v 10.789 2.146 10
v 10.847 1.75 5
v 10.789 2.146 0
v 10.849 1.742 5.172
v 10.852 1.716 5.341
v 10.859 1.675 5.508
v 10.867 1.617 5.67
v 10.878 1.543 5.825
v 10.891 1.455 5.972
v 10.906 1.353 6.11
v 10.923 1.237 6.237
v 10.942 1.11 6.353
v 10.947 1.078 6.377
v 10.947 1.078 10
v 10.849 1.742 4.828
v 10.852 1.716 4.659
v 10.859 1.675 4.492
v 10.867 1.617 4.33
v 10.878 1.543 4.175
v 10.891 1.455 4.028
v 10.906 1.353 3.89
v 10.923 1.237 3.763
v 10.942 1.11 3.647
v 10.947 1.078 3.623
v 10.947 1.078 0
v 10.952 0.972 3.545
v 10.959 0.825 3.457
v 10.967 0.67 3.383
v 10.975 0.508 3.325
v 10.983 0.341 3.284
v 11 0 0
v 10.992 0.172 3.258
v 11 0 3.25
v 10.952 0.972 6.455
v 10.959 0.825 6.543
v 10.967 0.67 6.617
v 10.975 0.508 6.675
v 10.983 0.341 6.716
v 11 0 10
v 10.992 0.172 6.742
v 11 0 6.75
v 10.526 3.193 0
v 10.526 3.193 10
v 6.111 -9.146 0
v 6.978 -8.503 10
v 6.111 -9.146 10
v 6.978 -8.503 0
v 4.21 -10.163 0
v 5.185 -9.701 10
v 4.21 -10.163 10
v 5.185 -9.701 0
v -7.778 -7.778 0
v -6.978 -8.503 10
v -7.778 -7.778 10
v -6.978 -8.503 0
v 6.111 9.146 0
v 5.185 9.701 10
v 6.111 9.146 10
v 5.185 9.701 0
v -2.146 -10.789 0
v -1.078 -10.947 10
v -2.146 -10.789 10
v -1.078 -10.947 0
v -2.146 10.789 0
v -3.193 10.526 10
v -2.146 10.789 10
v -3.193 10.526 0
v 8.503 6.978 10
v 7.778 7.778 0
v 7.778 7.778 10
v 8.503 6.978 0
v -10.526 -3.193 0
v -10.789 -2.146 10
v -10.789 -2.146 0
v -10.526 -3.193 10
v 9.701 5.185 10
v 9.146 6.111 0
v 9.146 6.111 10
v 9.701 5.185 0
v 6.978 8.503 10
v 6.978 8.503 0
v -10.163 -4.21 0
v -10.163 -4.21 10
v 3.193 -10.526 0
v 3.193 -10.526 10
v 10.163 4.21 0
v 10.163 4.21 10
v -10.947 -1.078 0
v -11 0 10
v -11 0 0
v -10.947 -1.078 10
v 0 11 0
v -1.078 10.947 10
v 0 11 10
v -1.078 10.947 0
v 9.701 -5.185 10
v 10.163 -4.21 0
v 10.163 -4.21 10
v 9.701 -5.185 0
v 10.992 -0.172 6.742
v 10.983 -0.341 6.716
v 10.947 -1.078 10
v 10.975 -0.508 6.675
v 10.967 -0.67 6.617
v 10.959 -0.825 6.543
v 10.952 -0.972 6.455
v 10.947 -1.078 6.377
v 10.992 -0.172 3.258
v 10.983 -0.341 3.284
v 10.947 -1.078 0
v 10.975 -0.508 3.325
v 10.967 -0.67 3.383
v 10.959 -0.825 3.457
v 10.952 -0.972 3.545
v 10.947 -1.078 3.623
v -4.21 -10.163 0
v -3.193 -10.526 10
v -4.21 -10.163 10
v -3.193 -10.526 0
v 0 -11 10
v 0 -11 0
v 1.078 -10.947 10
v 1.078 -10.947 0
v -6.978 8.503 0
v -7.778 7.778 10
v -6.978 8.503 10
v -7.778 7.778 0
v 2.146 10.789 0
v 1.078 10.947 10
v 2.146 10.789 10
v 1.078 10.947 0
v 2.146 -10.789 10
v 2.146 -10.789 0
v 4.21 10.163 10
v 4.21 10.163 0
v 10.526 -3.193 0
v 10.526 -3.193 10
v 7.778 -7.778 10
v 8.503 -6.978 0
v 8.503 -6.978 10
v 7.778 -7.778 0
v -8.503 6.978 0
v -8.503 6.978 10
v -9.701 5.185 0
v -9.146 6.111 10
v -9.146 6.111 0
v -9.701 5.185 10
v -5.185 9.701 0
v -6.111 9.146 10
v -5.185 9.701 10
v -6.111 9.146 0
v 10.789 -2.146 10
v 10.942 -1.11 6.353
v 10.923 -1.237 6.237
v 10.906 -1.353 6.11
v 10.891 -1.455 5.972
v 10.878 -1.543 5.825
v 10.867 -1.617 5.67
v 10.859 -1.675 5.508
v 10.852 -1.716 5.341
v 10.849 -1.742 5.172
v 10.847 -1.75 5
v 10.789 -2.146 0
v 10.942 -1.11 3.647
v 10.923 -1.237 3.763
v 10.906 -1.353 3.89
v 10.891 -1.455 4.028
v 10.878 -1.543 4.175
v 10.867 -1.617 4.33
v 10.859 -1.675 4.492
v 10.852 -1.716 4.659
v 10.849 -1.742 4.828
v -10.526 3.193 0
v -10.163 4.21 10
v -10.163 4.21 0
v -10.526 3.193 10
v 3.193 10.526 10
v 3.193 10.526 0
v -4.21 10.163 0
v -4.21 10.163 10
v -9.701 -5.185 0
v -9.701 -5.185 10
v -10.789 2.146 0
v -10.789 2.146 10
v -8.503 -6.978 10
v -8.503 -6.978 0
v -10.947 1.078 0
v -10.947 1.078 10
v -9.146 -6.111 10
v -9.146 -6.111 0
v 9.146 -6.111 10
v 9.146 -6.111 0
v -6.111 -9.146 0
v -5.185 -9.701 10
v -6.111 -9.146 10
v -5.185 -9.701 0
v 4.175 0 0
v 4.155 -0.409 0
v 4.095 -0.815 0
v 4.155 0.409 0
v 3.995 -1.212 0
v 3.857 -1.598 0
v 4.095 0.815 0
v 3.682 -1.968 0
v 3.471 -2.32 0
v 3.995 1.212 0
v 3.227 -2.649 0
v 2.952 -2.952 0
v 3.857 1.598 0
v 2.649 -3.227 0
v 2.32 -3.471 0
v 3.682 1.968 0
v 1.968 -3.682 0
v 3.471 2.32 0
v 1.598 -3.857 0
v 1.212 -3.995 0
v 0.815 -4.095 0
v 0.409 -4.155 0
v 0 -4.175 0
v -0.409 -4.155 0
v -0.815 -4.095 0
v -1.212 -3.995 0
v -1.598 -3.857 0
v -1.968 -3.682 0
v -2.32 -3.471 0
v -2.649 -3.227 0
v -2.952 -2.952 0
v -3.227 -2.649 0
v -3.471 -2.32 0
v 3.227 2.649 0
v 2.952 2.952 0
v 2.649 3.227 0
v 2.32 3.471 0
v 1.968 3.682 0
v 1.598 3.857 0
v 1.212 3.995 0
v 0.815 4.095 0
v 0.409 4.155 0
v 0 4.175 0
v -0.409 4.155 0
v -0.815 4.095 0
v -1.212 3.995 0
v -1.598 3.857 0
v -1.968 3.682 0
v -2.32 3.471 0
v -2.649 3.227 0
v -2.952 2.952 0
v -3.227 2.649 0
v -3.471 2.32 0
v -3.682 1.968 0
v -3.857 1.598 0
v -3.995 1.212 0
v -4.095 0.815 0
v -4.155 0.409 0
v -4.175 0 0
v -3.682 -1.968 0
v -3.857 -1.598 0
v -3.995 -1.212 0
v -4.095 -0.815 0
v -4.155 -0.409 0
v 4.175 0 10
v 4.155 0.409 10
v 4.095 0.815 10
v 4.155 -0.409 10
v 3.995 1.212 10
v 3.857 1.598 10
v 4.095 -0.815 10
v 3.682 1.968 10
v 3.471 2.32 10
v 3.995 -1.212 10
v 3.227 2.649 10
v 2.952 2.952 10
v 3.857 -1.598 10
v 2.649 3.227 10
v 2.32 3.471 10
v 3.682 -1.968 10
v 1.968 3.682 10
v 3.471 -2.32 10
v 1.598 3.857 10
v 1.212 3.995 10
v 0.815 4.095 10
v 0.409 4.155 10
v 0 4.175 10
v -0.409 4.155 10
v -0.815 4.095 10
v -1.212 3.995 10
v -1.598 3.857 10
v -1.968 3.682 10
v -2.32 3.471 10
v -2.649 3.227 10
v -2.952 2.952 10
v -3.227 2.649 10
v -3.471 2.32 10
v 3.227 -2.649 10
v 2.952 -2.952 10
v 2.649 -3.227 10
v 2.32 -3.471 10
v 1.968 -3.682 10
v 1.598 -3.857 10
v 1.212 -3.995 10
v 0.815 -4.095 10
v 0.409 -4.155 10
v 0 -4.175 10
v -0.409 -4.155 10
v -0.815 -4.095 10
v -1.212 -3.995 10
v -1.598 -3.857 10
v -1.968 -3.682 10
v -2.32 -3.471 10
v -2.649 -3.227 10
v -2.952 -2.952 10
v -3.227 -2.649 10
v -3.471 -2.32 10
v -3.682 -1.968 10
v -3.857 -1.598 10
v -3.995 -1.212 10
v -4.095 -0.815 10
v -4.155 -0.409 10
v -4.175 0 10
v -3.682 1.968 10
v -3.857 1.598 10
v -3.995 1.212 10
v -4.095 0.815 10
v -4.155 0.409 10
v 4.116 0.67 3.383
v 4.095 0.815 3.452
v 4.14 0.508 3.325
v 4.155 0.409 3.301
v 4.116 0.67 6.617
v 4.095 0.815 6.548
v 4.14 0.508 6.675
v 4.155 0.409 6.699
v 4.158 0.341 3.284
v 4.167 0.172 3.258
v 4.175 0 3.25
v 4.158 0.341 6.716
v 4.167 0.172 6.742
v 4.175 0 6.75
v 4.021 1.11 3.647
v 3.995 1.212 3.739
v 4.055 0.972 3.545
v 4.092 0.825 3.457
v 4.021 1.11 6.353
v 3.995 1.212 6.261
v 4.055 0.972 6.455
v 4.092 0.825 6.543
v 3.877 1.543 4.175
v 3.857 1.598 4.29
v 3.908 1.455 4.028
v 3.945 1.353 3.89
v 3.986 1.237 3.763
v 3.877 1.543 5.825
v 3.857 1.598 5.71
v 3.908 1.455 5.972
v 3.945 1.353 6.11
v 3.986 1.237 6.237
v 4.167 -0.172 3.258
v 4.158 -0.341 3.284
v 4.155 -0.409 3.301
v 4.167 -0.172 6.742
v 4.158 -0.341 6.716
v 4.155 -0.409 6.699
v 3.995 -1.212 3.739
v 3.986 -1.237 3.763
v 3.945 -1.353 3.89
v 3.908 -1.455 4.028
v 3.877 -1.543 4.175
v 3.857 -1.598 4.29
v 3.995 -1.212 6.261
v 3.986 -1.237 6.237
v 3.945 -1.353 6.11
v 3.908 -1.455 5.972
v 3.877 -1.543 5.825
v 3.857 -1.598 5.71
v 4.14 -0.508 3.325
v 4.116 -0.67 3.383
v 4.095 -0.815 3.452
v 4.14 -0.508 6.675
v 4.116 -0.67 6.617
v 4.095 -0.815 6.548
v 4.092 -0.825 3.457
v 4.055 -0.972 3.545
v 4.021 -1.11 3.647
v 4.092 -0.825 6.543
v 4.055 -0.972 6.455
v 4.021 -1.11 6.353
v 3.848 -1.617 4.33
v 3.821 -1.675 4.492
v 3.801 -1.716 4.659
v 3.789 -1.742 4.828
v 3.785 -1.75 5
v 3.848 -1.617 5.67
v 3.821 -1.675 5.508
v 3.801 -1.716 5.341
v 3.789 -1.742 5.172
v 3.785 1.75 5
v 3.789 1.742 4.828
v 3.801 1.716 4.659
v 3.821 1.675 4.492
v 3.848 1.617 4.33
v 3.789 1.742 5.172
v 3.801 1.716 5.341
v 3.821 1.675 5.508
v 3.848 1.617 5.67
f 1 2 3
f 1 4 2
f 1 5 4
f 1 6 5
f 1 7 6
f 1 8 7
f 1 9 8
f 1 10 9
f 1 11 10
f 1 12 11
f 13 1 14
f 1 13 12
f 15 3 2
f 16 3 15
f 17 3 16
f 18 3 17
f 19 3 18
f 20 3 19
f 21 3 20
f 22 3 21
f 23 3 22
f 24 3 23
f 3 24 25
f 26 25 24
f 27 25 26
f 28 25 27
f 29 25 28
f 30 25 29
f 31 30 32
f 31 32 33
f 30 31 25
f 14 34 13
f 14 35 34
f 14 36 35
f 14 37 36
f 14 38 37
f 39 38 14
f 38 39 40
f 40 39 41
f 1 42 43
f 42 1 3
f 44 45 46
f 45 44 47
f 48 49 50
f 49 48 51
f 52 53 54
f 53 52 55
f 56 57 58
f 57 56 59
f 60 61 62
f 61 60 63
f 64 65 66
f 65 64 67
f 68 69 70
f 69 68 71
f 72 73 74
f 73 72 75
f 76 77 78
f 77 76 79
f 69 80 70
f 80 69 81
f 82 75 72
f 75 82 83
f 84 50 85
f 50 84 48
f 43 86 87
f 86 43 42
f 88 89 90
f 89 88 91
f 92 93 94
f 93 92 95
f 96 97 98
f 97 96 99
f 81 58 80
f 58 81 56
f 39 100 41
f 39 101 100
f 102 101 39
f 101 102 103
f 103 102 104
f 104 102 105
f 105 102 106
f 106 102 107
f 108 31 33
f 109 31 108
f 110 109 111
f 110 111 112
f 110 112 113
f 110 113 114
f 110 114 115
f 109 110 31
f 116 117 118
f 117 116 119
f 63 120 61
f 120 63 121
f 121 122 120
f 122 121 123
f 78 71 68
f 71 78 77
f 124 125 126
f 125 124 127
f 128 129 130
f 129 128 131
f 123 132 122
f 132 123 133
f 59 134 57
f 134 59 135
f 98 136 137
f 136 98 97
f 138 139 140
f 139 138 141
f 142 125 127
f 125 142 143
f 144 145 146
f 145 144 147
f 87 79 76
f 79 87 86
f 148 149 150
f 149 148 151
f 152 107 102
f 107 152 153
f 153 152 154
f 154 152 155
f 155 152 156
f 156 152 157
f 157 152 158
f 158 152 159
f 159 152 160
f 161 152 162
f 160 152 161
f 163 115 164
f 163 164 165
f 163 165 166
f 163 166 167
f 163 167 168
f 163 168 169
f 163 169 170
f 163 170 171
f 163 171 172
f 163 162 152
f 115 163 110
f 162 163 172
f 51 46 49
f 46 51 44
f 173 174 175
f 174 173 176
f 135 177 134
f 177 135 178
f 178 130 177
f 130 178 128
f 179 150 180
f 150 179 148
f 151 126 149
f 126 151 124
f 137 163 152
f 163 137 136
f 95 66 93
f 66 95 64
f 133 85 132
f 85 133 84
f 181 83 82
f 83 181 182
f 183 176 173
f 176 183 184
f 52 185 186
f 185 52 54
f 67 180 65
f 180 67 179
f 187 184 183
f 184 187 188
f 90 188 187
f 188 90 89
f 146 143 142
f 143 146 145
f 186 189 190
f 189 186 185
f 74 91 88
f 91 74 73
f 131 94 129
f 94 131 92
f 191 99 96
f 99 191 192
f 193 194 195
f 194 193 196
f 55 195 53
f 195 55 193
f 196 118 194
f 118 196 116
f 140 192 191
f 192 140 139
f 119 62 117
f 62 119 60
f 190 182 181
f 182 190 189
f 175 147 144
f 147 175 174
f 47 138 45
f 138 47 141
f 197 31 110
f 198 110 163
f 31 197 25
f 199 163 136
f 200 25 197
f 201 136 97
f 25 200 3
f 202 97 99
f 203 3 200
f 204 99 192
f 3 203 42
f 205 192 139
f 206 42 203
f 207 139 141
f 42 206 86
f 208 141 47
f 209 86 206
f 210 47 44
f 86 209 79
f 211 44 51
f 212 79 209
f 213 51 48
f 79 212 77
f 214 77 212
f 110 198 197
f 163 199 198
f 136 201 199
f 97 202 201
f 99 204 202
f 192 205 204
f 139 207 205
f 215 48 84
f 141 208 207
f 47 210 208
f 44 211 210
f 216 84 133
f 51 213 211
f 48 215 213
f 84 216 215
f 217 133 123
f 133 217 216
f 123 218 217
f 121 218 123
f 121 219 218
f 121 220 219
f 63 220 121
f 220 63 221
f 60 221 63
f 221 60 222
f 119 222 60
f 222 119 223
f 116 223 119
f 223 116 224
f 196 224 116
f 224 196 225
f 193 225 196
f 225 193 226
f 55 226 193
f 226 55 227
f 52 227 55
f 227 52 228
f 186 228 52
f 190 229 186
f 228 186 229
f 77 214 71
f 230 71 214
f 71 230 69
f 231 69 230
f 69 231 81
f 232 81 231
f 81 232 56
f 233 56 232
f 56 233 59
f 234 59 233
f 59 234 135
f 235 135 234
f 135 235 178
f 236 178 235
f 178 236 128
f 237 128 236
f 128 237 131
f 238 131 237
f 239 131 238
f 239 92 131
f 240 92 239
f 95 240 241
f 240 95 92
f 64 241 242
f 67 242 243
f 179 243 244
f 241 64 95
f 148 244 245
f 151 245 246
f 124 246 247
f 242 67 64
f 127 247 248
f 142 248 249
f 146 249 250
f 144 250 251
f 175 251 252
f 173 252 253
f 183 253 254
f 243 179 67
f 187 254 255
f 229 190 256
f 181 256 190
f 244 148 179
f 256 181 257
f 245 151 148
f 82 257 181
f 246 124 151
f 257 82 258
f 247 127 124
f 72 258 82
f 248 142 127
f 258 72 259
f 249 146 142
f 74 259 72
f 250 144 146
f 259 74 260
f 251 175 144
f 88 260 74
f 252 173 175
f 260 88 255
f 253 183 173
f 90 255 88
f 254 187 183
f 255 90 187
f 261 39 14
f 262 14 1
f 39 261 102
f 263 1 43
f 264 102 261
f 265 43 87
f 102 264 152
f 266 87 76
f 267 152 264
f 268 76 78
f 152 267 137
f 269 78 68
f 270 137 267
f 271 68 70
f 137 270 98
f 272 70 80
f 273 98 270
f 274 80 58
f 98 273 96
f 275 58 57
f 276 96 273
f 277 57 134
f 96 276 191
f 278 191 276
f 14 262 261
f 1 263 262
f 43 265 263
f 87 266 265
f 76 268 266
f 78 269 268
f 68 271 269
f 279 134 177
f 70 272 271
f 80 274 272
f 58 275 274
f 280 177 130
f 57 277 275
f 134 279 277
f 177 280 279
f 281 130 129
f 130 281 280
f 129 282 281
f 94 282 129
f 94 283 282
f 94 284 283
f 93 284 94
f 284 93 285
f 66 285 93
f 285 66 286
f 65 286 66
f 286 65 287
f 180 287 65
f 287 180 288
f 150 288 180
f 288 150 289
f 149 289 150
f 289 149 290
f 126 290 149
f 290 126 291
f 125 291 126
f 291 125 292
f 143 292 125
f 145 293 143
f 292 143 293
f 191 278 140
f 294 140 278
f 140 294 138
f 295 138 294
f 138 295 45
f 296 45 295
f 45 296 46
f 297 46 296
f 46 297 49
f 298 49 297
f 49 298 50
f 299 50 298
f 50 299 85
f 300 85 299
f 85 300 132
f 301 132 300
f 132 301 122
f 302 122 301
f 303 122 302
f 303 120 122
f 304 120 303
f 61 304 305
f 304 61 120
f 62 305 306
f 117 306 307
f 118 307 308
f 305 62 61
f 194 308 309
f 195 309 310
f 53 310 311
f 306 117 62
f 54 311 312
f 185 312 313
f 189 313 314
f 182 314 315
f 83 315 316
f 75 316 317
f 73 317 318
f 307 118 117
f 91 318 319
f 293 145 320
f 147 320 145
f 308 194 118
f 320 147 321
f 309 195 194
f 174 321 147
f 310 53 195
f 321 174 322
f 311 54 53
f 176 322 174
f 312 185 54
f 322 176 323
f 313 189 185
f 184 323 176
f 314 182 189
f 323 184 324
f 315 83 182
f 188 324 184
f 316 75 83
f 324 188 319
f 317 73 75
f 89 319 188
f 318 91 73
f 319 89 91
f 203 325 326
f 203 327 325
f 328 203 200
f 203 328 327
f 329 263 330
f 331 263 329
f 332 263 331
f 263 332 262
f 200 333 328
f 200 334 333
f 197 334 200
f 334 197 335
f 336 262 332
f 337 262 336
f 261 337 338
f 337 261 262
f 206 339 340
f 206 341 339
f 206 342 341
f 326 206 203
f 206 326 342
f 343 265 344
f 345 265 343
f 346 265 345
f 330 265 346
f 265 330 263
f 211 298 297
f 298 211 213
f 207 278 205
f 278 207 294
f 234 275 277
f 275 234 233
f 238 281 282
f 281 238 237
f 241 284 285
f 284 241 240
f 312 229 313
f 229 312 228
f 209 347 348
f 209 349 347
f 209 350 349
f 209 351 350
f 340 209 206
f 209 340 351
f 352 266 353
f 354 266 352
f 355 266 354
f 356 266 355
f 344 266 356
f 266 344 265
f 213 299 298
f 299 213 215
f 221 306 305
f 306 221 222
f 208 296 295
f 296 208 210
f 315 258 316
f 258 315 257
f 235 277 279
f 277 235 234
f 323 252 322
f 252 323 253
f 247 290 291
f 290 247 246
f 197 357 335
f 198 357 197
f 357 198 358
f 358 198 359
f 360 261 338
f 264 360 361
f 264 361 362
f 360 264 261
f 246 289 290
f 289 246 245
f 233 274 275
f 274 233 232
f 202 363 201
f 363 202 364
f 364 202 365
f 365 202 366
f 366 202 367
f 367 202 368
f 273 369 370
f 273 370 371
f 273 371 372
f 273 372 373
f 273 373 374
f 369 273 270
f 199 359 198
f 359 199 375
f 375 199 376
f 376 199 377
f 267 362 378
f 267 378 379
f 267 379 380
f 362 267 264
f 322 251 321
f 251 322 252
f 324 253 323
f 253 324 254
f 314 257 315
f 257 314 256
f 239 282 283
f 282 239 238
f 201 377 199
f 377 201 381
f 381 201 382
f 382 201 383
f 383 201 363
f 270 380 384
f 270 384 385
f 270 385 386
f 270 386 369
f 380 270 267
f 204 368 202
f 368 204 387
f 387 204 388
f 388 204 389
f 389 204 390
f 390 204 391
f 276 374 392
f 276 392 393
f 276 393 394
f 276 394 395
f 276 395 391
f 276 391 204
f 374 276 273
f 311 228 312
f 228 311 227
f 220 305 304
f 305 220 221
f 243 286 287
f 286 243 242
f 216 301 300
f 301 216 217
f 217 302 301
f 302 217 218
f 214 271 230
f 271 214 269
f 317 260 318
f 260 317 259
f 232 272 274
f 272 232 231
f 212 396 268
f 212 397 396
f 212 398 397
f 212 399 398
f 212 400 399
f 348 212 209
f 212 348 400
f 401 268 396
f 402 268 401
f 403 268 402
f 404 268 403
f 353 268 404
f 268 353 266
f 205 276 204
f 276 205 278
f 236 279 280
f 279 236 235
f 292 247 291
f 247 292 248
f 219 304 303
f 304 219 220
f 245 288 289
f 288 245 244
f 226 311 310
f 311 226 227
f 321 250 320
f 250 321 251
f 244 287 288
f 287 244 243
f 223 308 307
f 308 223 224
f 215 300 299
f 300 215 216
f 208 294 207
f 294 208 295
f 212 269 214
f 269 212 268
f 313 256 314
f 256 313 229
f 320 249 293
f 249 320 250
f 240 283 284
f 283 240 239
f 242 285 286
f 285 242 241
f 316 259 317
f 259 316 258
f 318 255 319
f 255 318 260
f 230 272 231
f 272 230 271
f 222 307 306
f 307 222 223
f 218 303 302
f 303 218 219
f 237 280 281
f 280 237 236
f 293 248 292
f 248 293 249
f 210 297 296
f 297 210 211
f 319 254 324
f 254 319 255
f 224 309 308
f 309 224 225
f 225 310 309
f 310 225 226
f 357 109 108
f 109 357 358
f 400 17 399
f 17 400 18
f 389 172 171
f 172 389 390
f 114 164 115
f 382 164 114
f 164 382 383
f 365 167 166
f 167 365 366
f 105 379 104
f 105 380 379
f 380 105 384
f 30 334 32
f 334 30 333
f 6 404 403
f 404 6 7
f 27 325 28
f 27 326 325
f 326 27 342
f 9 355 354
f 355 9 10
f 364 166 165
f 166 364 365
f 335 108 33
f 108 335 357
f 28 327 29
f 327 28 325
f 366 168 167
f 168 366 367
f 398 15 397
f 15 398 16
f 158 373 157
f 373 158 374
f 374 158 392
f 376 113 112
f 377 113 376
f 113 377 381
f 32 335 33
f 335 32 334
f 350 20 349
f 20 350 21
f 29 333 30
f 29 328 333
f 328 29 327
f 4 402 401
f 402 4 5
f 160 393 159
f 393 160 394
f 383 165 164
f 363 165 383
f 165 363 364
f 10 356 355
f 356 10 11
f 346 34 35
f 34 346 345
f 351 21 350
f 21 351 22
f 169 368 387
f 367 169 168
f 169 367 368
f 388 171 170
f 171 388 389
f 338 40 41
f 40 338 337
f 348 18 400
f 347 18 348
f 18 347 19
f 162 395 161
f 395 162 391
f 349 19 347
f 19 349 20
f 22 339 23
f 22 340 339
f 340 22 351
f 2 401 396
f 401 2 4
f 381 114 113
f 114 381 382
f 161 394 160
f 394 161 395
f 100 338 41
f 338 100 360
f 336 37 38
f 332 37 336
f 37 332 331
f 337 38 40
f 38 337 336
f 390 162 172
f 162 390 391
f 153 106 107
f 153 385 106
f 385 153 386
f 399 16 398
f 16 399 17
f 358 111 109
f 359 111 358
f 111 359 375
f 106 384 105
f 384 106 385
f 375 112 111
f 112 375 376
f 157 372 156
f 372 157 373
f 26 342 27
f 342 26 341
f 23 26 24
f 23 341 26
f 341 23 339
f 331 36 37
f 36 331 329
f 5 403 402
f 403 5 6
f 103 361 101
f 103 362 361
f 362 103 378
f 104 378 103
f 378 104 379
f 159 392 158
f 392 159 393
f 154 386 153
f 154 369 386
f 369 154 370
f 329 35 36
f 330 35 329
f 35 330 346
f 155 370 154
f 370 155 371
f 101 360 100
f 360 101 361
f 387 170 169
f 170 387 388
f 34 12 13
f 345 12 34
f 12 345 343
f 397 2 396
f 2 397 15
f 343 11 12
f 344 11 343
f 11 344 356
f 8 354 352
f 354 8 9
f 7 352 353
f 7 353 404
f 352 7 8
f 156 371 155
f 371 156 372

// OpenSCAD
// file: parameters.scad
// =============================================================================
// Gen-AT Dual-rotor copper-centroid hypermicro AFPM - WOUND-AWARE (HARD GATE)
// PRIMARY challenger vs Gen-AQ. Magnets @ R=38.5 + 210 t + former_web 1.22 -> m2m 4.68.
// =============================================================================

// --- Wire / wind budget (26 AWG, ~1 lb spool ~ 390 m bare-equiv) --------------
wire_awg            = 26;
wire_od             = 0.45;     // insulated OD mm
turns               = 210;      // +5 vs Gen-AQ 205
fill                = 0.70;
layers_per_face     = 2;        // axial layers proud of EACH flange
wind_build_axial    = layers_per_face * wire_od * fill;   // 0.63 mm
wind_build_radial   = 3 * wire_od * fill;                 // 0.945 mm

// --- Pancake former (bare STL) -----------------------------------------------
coil_id_r           = 14.5;     // copper-centroid window centered ~R=38.5
coil_od_r           = 62.5;
span_deg            = 26.0;     // 12 stations x 30 deg pitch
former_web          = 1.22;     // thinner vs AQ 1.25 (print-safe >=1.20 LB)
flange_t            = 0.60;
wall                = 1.2;
slot_w              = 2.4;
mount_hole          = 3.5;
tab_len             = 7.0;

former_bare_h       = former_web + 2 * flange_t;            // 2.42 mm
coil_envelope_h     = former_bare_h + 2 * wind_build_axial; // 3.68 mm

// --- Running clearance (magnet face -> WOUND face) EACH side ------------------
run_clear           = 0.50;     // PASS floor >= 0.5
gap_spacer_h        = run_clear + wind_build_axial;         // 1.13 mm
m2m                 = coil_envelope_h + 2 * run_clear;      // 4.68 mm (beats Gen-AQ 4.71)

// --- Mid stator (12 pancakes 3ph; winds proud both faces) ---------------------
coil_stations       = 12;
bay_r_in            = coil_id_r - 2.0 - wind_build_radial;
bay_r_out           = coil_od_r + 2.0 + wind_build_radial;
bay_span            = span_deg + 4.0;
bay_offset          = 2.0;
stator_thick        = former_bare_h;                        // winds proud +/-Z
stator_od           = 160.0;
shaft_clear_stator  = 34.0;
coil_mount_r        = 25.0;

// --- Rotors (x2) - 8xO20 @ R=38.5 (copper centroid) + 24xO5 Halbach ----------
large_pocket_d      = 20.3;
small_pocket_d      = 5.3;
pocket_h            = 5.2;
large_n             = 8;
R_large             = 38.5;     // covers ~28.5-48.5 over copper centroid ~38.5
R_small_inner       = 23.5;
R_small_mid         = 38.5;
R_small_outer       = 55.5;
carrier_od          = 156.0;
carrier_thick       = 7.5;
hub_h               = 10.0;
hub_od              = 30.0;
rotor_b_offset_deg  = 22.5;

// --- Modular MAX interface (Gen-E family) ------------------------------------
shaft_bore          = 8.35;
bearing_d           = 21.85;
bearing_h           = 7.2;
m3_clear            = 3.5;
bolt_r_inner        = 36.0;
bolt_n_inner        = 6;
flange_bolt_r       = 72.0;
flange_bolt_n       = 6;
brace_r             = 68.0;
brace_d             = 4.3;
brace_n             = 4;

spacer_pad_od       = 14.0;
spacer_pad_id       = m3_clear;
endbell_od          = 160.0;
endbell_thick       = 8.0;
endbell_shaft_clear = 10.0;

$fn = 64;
// main file
// Gen-AT shaft collar — print ×2–4
include <parameters.scad>;
$fn = 64;
od = 22; id = shaft_bore; h = 10; set_d = 3.5;
difference() {
    cylinder(d=od, h=h);
    translate([0, 0, -0.1]) cylinder(d=id, h=h + 0.2);
    translate([0, 0, h/2]) rotate([0, 90, 0]) cylinder(d=set_d, h=od);
}
